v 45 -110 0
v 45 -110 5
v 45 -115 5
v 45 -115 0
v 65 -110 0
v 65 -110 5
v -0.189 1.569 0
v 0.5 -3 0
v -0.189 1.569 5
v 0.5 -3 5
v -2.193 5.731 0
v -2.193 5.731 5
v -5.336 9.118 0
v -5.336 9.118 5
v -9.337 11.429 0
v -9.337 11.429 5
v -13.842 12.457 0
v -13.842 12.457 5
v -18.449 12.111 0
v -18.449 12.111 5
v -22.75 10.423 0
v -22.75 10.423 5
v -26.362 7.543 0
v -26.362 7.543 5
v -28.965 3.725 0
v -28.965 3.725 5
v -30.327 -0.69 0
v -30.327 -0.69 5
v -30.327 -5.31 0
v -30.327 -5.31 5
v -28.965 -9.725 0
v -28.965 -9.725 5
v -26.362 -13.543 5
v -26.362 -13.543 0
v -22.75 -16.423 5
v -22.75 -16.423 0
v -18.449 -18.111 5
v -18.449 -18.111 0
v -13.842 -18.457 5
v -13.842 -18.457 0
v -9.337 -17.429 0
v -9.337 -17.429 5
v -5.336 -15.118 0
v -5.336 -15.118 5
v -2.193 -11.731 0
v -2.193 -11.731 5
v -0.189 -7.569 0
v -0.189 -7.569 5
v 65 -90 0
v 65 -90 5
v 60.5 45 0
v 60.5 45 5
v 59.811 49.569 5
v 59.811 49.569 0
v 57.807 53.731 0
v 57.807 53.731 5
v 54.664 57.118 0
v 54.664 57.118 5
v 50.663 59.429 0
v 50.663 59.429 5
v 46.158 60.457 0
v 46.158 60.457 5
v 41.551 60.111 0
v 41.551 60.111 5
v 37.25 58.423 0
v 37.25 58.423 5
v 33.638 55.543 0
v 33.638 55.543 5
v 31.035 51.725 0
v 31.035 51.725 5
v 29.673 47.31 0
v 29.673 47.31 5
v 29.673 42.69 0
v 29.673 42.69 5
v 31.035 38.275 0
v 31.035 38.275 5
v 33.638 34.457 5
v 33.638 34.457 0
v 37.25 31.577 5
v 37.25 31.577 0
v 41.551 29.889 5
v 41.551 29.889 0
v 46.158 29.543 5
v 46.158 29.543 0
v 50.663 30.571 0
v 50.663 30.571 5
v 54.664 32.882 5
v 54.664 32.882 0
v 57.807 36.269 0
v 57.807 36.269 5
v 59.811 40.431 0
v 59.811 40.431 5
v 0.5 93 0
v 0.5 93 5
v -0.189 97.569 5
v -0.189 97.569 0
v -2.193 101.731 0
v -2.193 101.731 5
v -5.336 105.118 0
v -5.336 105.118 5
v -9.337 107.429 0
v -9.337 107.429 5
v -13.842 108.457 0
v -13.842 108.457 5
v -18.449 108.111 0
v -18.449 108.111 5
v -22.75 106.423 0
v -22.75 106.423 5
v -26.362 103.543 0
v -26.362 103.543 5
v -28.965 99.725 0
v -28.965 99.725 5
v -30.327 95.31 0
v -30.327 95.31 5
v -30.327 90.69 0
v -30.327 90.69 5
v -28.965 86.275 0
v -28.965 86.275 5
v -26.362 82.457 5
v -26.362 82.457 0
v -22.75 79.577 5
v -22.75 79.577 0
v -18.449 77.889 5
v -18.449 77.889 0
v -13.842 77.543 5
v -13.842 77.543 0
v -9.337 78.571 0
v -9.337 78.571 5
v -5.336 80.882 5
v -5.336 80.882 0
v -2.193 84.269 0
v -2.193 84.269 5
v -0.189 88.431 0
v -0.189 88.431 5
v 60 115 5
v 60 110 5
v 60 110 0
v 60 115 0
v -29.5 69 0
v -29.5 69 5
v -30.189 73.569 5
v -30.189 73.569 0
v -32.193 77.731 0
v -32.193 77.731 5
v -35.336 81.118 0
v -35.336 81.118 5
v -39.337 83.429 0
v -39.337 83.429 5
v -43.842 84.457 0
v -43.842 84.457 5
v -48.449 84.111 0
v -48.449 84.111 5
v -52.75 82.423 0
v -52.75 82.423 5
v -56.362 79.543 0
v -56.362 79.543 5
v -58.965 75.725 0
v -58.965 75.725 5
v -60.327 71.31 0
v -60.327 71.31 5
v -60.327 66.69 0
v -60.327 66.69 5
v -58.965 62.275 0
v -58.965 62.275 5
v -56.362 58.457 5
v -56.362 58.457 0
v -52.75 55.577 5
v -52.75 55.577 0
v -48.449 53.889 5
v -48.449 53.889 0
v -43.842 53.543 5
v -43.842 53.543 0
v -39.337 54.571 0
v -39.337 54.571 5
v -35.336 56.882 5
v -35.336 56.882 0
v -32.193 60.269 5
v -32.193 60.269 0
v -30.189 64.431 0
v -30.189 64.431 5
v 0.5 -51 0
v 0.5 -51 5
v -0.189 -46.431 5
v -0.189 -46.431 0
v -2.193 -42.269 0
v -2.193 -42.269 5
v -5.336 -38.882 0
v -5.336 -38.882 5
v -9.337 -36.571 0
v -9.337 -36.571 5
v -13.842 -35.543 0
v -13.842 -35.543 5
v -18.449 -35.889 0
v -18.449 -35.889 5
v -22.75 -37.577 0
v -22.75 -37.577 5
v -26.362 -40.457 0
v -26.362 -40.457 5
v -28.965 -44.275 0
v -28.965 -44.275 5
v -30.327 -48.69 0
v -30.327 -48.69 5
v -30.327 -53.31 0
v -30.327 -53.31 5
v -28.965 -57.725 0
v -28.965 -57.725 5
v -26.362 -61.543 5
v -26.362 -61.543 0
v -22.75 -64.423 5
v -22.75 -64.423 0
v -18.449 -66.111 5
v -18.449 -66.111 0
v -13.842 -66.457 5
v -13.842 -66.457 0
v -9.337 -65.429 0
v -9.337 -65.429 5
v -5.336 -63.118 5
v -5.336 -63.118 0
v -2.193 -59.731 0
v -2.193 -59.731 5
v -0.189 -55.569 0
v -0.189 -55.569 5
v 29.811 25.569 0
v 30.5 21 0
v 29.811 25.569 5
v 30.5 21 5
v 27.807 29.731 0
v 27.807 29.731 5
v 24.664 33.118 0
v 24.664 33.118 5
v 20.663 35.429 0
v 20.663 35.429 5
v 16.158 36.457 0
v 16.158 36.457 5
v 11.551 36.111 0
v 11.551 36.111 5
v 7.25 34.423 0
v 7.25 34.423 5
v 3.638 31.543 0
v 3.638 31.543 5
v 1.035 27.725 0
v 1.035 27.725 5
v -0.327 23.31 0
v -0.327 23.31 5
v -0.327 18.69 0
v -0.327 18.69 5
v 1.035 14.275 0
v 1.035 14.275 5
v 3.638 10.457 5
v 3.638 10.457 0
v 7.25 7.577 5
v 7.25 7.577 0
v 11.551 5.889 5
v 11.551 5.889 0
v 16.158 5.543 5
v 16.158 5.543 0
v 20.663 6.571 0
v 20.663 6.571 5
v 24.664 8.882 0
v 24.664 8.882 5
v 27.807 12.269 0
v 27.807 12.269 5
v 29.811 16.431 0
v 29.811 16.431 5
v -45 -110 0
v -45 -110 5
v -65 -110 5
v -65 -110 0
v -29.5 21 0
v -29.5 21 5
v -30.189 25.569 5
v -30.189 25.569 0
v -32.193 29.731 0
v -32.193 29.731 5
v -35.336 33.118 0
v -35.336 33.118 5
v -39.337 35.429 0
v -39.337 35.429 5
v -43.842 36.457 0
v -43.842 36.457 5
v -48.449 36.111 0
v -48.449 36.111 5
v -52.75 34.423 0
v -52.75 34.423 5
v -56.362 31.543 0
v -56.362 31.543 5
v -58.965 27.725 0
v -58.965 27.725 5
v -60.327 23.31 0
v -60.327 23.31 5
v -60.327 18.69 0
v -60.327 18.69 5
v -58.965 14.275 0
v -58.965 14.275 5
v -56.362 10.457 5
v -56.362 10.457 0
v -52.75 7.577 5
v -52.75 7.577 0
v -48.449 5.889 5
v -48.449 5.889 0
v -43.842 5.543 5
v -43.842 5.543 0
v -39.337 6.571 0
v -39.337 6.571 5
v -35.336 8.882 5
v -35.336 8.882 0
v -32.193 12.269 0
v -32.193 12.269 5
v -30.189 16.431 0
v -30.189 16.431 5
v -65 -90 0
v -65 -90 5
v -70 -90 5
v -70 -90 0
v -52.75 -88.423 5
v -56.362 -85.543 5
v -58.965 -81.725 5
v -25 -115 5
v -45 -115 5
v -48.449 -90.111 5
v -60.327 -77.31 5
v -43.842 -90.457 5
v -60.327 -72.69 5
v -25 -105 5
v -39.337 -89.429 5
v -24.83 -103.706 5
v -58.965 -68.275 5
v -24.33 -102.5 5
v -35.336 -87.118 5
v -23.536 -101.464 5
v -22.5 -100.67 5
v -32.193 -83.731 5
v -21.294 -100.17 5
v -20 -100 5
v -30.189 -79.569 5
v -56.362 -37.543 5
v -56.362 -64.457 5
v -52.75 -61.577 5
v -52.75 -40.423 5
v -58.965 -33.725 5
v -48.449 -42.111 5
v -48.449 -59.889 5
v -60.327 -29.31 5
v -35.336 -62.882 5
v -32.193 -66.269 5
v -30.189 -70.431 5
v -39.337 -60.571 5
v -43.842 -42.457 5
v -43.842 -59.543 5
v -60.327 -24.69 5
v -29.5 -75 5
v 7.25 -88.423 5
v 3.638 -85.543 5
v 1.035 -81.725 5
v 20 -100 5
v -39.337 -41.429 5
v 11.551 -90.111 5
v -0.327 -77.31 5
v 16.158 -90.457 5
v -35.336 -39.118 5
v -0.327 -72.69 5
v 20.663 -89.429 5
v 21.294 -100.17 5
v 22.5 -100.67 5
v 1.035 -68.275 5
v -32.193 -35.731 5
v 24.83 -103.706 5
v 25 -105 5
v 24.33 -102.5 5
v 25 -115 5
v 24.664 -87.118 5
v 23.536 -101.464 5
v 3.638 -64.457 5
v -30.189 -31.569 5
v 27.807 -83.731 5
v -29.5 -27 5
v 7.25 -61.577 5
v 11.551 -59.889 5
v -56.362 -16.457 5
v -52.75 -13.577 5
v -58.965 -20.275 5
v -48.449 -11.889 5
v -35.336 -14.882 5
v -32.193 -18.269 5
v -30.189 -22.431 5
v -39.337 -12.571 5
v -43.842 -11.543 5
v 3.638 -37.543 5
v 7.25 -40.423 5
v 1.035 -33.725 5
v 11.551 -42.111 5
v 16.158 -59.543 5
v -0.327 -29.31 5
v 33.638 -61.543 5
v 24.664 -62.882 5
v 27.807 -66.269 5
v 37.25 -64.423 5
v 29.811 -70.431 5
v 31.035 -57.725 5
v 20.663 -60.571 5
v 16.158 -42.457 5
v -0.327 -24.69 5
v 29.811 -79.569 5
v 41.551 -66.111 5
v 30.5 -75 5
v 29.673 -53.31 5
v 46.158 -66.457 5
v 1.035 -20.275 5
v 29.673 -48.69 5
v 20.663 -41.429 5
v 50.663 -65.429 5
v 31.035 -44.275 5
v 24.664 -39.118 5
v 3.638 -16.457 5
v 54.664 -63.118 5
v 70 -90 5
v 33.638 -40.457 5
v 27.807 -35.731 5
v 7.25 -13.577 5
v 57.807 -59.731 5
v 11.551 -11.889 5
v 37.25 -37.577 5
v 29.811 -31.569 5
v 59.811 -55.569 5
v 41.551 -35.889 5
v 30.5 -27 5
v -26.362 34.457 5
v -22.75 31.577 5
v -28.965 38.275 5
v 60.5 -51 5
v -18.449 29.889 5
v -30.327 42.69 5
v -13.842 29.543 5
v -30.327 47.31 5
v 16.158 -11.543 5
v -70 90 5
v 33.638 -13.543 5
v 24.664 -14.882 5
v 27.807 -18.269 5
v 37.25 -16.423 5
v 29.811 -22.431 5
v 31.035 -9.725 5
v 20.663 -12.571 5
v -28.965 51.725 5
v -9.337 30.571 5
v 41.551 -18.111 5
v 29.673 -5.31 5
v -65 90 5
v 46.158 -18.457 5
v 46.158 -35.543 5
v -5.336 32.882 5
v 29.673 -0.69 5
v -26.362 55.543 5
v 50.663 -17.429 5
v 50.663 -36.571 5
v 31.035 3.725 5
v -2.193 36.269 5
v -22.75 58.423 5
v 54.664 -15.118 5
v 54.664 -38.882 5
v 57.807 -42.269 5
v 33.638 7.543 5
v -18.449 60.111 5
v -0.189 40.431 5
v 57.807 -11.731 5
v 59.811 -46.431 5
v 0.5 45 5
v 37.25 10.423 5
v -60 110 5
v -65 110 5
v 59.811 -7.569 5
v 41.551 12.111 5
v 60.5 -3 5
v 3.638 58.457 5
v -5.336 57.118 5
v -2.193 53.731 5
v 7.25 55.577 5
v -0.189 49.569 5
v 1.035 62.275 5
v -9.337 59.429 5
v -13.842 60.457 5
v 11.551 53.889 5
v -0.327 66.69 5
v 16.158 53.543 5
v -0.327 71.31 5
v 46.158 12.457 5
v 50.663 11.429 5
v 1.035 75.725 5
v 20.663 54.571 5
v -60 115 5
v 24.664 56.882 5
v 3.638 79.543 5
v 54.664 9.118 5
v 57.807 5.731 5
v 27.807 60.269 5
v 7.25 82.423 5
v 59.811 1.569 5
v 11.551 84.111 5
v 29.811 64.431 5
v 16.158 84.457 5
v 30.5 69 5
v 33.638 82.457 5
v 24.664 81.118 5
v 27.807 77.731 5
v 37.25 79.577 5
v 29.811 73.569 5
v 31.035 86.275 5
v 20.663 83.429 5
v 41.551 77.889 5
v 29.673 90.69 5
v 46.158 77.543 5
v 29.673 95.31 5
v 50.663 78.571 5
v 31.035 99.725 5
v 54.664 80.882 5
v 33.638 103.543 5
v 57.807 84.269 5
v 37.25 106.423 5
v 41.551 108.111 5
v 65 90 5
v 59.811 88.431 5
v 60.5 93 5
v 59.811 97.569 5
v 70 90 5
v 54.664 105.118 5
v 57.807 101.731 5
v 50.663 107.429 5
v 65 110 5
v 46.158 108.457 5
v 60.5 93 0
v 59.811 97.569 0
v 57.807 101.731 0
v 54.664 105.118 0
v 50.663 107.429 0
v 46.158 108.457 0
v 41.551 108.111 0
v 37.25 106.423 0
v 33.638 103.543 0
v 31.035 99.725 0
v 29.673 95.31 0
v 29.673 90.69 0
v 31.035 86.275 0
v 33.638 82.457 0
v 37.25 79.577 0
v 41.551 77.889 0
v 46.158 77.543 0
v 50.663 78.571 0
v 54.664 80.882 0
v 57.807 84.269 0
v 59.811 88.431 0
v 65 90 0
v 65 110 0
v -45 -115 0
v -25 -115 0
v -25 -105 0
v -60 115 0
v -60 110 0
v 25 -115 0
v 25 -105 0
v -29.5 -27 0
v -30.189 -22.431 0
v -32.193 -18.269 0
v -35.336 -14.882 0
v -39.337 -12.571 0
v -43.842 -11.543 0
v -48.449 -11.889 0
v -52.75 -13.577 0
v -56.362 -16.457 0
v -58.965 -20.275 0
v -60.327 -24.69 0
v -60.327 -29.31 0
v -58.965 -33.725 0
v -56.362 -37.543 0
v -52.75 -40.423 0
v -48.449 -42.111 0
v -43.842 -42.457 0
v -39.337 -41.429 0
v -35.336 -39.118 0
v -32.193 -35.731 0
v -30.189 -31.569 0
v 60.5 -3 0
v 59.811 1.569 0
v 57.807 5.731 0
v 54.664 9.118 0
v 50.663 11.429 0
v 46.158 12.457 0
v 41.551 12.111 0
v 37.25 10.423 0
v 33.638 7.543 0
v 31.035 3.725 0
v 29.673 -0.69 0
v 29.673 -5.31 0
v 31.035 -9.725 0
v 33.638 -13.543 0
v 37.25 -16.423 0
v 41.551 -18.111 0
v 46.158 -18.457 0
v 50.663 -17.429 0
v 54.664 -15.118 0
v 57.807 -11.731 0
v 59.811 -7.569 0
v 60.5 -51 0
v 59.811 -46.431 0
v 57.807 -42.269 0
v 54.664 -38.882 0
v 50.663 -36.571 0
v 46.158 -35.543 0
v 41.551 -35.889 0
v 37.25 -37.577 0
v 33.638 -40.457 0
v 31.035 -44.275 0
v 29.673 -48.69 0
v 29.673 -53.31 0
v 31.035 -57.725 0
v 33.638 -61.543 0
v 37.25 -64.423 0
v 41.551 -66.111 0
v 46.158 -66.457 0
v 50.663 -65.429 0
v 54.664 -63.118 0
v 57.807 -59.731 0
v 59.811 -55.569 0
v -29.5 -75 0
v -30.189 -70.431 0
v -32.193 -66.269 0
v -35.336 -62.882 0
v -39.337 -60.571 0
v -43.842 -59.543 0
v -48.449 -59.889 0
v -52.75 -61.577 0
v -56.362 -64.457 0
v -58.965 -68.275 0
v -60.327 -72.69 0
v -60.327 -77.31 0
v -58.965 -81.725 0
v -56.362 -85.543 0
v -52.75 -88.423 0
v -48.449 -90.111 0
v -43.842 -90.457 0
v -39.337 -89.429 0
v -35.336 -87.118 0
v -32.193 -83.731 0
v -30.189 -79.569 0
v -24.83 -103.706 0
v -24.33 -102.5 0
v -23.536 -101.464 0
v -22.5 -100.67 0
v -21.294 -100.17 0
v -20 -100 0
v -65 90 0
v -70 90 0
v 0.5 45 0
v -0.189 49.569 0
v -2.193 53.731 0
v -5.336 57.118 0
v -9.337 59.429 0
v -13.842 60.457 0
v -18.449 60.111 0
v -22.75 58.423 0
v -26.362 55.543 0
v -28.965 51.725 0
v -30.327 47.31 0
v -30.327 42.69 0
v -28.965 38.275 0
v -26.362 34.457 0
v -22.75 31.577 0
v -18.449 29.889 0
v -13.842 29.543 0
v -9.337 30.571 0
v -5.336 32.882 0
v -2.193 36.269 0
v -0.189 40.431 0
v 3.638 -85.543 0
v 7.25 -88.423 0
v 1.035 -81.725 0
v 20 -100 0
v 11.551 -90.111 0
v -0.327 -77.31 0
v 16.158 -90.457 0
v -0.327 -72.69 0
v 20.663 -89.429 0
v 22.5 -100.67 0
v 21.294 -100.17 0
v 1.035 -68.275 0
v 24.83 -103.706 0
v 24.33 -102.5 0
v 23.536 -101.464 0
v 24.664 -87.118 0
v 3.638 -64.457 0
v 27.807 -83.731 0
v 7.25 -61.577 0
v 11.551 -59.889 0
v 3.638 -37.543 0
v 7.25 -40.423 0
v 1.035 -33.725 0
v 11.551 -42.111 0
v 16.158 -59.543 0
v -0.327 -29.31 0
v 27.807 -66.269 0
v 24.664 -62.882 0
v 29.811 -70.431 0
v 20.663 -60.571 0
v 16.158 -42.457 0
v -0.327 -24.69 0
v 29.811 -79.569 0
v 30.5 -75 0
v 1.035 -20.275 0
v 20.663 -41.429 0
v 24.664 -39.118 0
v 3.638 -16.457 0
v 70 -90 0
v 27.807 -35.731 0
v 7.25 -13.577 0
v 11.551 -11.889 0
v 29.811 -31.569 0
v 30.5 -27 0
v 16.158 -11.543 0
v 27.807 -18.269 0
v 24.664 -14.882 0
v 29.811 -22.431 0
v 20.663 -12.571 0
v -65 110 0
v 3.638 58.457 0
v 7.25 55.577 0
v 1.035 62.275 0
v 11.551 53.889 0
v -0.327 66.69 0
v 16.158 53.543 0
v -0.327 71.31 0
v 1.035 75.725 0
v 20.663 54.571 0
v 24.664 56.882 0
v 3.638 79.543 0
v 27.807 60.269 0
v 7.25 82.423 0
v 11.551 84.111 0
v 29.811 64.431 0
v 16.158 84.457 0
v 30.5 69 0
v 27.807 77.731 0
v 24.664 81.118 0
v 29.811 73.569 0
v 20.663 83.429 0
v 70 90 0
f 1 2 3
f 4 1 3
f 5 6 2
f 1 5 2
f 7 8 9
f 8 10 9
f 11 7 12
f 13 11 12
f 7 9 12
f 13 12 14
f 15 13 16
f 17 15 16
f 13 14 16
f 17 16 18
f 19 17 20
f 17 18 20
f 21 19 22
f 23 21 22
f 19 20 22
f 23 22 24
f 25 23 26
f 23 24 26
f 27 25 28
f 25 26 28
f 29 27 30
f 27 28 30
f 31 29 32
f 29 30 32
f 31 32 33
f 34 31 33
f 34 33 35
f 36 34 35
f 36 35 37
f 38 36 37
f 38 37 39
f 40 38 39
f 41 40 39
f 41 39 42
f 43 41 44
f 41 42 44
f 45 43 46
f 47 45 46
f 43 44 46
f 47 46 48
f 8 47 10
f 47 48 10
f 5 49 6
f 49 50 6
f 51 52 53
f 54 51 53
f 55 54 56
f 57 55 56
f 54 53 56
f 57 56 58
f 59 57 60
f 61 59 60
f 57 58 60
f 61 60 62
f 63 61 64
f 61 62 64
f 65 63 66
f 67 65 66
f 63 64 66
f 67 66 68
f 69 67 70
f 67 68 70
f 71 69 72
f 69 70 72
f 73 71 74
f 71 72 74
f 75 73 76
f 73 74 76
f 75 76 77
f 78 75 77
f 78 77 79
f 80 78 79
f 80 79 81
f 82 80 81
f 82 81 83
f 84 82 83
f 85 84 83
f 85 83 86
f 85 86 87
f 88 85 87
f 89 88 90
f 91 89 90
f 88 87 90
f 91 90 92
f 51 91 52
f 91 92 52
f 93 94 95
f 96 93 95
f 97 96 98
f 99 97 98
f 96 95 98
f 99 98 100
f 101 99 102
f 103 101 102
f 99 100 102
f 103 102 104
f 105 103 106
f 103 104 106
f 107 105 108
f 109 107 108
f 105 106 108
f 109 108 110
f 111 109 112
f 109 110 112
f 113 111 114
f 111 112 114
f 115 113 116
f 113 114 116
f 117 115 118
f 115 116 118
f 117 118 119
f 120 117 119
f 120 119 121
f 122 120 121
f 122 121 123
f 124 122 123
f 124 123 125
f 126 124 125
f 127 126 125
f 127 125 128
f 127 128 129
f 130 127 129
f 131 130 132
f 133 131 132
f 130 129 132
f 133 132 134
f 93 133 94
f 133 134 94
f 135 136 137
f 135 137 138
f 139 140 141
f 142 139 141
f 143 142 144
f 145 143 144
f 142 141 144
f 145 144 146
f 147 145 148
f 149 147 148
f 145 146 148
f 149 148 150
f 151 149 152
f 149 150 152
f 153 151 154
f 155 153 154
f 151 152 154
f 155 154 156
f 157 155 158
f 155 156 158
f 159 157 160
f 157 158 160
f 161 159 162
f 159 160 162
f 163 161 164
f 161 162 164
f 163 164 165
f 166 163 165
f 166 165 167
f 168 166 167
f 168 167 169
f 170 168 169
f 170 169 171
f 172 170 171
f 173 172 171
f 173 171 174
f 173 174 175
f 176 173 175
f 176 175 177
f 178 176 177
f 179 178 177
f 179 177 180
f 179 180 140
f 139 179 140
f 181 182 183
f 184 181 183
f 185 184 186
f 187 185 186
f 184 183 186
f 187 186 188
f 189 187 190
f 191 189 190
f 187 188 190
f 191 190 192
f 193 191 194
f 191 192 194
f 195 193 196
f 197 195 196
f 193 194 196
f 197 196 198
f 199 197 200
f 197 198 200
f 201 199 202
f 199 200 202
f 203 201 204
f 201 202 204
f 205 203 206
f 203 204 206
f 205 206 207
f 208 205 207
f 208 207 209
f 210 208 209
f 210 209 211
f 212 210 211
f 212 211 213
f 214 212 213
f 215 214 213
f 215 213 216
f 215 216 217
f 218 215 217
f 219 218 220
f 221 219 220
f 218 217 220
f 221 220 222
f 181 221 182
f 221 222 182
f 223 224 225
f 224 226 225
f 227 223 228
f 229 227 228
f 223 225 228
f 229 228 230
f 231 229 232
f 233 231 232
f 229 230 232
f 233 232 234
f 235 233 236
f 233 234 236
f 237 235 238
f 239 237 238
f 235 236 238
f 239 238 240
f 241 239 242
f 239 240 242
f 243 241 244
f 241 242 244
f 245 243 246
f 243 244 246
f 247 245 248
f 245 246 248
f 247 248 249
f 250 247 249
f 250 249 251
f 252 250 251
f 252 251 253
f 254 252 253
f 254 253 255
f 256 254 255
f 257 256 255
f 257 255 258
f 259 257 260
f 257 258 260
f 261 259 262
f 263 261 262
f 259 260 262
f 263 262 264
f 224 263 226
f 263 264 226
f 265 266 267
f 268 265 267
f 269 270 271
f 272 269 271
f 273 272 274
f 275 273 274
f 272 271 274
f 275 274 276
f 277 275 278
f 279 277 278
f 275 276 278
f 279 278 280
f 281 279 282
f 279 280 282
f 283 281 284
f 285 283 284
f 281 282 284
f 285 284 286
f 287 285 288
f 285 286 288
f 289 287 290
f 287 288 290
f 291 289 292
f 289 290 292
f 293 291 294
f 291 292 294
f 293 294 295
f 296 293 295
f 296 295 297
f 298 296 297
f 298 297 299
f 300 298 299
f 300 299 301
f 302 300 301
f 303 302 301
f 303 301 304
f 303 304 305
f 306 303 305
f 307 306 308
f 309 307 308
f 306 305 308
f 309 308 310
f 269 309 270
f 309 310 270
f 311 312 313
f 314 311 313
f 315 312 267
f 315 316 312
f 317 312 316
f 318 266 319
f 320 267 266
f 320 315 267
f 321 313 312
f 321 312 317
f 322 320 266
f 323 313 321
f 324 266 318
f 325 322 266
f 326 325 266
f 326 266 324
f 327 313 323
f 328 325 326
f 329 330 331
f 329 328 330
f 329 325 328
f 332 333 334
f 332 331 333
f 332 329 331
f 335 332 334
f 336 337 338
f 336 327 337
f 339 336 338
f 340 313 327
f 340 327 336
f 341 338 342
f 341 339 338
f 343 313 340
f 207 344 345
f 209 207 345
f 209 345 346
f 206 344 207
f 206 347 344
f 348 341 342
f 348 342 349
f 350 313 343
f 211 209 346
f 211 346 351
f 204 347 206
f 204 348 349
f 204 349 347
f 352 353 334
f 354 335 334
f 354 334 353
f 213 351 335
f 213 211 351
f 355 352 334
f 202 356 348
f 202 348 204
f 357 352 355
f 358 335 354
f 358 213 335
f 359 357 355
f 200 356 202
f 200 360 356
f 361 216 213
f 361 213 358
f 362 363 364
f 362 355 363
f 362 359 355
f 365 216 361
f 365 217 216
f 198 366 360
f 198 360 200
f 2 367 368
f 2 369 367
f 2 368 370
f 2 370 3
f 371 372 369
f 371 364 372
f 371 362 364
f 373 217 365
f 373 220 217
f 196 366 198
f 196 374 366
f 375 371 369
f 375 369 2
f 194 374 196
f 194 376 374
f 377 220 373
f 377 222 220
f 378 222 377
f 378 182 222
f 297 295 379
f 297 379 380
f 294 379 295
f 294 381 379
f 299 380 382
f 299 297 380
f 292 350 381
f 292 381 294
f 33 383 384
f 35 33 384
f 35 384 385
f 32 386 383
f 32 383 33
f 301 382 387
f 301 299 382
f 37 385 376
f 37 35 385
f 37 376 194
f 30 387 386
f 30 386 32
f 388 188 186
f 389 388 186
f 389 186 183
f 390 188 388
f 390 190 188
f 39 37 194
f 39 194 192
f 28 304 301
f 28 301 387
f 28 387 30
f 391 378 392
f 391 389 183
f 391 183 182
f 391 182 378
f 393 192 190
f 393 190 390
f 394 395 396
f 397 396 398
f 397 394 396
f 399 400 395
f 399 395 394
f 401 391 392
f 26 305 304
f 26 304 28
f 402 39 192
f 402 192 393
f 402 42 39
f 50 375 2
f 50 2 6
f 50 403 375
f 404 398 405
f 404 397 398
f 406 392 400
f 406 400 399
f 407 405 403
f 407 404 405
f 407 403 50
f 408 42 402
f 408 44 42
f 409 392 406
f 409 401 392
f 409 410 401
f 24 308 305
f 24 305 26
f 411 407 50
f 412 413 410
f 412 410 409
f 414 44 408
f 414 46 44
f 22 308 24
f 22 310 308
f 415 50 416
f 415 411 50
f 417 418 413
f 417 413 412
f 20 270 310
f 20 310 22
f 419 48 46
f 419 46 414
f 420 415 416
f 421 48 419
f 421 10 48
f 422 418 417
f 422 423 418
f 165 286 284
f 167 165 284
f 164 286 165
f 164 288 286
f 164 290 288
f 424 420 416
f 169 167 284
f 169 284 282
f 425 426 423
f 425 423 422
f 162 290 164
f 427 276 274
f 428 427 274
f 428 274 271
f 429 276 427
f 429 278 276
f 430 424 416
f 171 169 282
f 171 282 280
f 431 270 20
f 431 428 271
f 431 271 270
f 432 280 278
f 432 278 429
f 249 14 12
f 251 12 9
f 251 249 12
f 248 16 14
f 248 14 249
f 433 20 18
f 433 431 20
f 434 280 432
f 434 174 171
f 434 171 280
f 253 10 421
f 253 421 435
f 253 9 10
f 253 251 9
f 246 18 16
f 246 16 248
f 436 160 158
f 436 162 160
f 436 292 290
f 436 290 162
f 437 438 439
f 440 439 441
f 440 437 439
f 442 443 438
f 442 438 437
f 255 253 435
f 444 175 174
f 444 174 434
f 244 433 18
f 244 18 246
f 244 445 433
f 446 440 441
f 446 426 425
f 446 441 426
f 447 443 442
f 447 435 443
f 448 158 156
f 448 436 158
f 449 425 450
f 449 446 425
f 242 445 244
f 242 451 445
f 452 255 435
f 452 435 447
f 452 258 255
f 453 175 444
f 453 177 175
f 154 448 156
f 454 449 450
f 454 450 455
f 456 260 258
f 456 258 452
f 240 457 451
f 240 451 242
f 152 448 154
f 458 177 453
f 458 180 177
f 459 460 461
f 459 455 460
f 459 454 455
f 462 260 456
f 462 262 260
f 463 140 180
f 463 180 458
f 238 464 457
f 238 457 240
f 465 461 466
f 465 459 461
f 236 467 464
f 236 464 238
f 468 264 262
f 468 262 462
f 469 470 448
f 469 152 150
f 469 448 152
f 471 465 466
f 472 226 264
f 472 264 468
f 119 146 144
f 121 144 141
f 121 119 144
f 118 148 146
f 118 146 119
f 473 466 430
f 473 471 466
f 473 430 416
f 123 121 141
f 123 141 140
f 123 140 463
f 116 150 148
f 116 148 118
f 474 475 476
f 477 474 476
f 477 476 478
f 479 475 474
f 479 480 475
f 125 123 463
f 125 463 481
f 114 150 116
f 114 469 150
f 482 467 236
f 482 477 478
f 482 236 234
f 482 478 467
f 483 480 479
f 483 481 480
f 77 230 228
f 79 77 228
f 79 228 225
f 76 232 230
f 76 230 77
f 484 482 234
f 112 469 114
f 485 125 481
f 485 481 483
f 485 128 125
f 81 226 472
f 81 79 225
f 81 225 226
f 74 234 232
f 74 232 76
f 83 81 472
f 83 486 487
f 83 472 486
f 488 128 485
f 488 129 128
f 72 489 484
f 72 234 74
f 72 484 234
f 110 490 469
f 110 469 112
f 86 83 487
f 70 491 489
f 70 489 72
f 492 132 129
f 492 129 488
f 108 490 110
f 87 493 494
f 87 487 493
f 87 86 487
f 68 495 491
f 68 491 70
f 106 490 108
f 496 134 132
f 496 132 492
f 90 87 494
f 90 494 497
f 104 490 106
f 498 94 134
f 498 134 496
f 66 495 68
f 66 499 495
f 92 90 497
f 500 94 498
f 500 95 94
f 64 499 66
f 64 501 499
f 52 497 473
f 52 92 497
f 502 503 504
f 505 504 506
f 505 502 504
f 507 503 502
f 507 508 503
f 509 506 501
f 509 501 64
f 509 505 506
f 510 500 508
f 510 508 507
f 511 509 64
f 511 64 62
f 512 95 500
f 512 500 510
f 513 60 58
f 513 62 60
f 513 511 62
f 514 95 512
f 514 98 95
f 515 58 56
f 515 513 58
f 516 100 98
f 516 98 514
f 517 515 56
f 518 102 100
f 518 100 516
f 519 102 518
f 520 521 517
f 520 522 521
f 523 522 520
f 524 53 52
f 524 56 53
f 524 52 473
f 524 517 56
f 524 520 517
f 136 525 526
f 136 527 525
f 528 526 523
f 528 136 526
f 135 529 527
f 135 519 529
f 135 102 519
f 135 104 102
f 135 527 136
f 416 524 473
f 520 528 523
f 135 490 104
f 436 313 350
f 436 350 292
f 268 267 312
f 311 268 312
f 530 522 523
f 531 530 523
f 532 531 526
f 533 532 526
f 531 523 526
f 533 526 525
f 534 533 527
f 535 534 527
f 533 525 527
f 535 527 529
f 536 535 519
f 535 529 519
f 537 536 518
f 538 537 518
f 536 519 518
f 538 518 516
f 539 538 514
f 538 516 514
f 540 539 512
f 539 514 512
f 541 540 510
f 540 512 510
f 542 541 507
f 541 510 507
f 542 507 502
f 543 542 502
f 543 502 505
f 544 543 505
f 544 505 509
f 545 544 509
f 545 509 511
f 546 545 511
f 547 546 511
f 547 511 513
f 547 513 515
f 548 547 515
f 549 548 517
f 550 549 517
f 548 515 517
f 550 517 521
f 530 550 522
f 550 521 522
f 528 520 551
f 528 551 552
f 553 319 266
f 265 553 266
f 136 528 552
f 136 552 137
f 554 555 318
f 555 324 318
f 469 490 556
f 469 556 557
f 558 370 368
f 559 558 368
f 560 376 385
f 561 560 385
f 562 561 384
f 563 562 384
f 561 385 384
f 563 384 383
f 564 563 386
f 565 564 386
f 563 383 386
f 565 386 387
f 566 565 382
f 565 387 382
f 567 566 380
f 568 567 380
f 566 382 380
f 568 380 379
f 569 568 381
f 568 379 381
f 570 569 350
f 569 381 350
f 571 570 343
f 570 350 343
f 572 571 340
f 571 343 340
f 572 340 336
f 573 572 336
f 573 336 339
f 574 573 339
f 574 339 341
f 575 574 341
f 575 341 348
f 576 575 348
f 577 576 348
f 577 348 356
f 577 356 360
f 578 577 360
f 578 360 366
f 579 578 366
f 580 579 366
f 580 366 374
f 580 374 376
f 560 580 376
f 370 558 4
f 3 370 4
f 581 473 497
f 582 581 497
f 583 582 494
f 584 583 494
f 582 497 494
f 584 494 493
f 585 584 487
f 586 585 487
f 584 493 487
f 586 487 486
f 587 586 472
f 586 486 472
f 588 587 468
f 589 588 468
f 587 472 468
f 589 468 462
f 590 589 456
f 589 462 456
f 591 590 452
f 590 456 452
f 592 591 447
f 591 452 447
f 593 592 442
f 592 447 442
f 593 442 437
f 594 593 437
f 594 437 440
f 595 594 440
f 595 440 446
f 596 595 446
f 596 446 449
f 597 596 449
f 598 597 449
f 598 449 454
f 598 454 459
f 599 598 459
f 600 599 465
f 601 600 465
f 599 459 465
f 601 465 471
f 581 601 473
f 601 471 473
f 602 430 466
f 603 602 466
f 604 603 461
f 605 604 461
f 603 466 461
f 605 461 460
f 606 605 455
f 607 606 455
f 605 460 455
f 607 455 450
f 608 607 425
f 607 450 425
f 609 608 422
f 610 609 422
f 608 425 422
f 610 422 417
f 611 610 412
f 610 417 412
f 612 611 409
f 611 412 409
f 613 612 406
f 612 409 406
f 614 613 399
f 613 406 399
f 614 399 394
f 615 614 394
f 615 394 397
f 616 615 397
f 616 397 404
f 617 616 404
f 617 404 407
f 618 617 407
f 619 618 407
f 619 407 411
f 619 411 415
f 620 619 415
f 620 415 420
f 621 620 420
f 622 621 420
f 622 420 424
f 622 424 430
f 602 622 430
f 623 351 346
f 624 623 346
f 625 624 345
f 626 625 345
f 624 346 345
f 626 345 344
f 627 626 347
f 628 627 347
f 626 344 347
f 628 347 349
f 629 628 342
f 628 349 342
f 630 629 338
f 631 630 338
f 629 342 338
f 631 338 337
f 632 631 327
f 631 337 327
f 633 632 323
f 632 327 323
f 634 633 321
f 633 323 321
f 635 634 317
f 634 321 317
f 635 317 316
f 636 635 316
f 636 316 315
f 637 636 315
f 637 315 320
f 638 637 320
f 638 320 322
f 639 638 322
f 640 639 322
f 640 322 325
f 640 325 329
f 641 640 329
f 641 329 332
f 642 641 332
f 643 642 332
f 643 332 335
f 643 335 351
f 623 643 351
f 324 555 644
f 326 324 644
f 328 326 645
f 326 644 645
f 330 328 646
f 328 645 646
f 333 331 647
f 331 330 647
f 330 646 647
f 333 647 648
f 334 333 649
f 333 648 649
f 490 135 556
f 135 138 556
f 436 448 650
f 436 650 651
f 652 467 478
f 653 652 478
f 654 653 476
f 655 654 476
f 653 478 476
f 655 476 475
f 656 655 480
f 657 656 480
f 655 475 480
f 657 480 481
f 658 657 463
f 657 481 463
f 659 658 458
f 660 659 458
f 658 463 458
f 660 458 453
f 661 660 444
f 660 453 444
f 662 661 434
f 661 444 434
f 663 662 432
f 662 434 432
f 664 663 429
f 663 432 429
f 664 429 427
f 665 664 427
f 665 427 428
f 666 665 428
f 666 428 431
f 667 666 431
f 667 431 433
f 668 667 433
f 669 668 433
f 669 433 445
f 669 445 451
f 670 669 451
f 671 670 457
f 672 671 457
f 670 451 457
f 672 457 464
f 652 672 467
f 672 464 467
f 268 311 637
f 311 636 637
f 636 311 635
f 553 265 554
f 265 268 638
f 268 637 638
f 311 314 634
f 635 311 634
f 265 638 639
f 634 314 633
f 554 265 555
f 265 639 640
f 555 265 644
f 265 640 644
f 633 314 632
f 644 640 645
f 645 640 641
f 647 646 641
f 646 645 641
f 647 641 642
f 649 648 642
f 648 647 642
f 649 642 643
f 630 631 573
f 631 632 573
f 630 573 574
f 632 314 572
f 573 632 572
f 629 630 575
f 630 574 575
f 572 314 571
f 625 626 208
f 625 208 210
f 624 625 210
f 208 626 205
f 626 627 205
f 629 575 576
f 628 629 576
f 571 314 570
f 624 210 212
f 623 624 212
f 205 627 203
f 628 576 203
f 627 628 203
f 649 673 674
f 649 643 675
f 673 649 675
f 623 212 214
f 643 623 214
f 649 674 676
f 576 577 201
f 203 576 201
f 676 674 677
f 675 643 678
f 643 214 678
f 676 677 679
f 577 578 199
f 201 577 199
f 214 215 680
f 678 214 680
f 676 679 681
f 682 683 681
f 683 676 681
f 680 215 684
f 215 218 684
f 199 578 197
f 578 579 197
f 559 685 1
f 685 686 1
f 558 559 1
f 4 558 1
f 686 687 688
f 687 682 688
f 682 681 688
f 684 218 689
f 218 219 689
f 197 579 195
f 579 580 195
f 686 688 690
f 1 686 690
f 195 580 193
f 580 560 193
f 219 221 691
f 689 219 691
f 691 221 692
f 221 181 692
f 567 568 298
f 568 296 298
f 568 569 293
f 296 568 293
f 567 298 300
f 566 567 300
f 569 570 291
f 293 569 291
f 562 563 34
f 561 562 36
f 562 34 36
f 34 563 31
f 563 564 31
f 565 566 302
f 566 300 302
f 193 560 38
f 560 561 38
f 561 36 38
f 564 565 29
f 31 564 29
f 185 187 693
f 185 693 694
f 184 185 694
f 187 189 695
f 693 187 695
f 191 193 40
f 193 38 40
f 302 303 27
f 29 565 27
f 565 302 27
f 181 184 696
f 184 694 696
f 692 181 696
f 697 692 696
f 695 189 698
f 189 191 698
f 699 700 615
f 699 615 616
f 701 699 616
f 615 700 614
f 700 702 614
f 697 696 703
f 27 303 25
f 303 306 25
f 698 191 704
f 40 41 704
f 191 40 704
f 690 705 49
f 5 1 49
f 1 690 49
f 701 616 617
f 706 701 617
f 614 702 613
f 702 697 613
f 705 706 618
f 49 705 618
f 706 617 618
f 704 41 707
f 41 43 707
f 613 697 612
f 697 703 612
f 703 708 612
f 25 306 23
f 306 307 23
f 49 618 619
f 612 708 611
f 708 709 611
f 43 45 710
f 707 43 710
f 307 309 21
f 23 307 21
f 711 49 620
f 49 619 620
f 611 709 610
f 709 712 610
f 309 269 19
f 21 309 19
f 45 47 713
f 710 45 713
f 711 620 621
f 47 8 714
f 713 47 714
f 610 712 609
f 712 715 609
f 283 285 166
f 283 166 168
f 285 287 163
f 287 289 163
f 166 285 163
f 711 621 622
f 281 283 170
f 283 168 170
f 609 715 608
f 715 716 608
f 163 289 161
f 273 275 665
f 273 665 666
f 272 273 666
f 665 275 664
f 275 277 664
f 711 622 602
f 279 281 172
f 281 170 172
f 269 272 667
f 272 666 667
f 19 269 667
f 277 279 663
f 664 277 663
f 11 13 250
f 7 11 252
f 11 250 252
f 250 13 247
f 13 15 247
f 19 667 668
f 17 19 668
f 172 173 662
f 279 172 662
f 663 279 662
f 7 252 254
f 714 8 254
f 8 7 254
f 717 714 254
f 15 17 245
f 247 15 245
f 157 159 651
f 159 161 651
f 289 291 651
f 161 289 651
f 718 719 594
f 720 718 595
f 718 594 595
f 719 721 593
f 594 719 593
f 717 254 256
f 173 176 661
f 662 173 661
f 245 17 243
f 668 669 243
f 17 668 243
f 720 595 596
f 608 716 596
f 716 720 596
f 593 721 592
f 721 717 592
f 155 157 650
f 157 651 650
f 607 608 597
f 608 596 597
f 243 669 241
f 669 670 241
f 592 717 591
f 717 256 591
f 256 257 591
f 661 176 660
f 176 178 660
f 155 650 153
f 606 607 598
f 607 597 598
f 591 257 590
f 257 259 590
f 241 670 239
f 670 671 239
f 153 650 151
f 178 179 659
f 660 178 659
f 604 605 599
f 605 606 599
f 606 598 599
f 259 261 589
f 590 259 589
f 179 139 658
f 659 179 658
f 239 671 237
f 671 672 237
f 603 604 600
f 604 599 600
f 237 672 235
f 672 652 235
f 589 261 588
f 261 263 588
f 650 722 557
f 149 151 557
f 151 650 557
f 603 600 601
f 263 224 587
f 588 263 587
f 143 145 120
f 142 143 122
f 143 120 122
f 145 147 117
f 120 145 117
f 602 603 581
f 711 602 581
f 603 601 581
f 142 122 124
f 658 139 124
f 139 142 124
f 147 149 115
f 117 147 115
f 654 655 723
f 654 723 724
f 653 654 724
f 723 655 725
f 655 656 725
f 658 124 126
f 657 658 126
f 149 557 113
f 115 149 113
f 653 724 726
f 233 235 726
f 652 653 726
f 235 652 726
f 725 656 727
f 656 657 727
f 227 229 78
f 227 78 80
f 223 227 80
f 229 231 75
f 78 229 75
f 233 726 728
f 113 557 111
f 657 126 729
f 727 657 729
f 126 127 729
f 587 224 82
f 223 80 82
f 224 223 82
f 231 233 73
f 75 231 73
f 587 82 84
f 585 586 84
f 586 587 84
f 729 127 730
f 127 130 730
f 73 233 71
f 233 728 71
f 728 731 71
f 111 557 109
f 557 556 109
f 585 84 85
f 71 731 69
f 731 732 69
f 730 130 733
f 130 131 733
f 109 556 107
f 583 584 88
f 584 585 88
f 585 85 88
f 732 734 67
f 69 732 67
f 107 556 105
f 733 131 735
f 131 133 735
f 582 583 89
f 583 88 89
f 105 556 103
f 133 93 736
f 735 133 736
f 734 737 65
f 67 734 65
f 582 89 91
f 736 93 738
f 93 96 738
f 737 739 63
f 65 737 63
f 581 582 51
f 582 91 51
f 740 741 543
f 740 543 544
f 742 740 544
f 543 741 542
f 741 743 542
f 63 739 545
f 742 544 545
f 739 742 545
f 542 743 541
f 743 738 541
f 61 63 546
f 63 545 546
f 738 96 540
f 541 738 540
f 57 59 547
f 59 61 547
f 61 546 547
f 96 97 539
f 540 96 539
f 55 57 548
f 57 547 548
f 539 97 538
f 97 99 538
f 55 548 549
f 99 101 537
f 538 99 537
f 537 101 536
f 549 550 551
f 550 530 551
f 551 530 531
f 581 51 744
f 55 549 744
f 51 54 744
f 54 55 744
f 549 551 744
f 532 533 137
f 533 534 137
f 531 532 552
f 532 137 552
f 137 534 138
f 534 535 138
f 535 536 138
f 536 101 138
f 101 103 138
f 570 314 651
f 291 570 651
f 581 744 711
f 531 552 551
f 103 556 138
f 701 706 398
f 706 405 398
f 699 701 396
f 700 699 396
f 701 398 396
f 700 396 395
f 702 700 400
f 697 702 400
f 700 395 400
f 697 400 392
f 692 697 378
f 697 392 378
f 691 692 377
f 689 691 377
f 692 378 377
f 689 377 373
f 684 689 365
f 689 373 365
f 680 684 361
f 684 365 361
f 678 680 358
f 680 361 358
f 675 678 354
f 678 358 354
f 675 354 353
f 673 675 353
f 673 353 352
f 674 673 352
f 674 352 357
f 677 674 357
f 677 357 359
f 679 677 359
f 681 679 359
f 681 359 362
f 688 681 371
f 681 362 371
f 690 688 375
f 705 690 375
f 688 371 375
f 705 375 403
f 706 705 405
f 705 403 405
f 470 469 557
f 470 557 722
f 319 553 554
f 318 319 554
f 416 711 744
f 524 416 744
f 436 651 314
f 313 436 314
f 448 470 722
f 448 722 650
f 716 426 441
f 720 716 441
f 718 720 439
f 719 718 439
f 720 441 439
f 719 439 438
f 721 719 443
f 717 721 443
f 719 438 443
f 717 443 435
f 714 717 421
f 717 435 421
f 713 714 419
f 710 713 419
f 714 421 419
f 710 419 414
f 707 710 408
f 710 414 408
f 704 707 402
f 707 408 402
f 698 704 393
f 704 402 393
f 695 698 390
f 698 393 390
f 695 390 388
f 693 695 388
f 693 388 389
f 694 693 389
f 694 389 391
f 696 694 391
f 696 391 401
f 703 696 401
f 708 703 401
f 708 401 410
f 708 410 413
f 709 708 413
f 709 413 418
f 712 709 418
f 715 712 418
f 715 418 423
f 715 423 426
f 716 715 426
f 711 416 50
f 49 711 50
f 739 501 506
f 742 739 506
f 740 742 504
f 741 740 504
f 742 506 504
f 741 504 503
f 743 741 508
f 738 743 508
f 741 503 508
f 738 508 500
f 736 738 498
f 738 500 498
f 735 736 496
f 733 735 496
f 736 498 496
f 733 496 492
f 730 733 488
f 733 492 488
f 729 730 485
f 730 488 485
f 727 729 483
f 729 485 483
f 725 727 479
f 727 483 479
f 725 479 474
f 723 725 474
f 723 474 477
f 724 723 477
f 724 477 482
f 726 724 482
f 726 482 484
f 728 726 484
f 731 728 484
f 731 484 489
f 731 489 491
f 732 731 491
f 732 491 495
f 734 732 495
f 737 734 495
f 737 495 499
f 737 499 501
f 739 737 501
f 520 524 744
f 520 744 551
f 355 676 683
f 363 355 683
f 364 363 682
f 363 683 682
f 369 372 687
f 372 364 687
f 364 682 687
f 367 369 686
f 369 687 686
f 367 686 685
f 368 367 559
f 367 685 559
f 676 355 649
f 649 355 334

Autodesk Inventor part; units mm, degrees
ref_plane "YZ Plane" through (0, 0, 0) normal (1, 0, 0) x (0, 1, 0)
ref_plane "XZ Plane" through (0, 0, 0) normal (0, 1, 0) x (-1, 0, 0)
ref_plane "XY Plane" through (0, 0, 0) normal (0, 0, 1) x (1, 0, 0)
sketch "Sketch1" plane through (0, 0, 0) normal (0, 0, 1) x (1, 0, 0)
  line L0 (-70, -115) -> (70, -115)
  line L1 (70, -115) -> (70, 115)
  line L2 (70, 115) -> (-70, 115)
  line L3 (-70, 115) -> (-70, -115)
  point P0 (0, 0)
  dimension "width" = 140
  dimension "d1" = 70
  dimension "d2" = 230
  dimension "d3" = 115
extrude "Extrusion1" add sketch "Sketch1" along normal blind 5
sketch "Sketch2" plane through (0, 0, 5) normal (0, 0, 1) x (1, 0, 0)
  circle A0 centre (-45, 69) radius 15.5
  circle A1 centre (-15, 93) radius 15.5
  point P0 (0, 0)
  dimension "d6" = 31
  dimension "d7" = 69
  dimension "d8" = 45
  dimension "d17" = 31
  dimension "d18" = 30
  dimension "d19" = 24
extrude "Extrusion2" cut sketch "Sketch2" against normal blind 5
pattern_linear "Rectangular Pattern2" count 2 spacing 60 along (1, 0, 0) count 4 spacing 48 along (0, -1, 0) of "Extrusion2"
sketch "Sketch3" plane through (0, 0, 5) normal (0, 0, 1) x (1, 0, 0)
  line L0 (-70, -115) -> (70, -115) projected
  line L1 (-70, -115) -> (-45, -115)
  line L2 (-45, -115) -> (-45, -110)
  line L3 (-45, -110) -> (-70, -110)
  line L4 (-70, -110) -> (-70, -115)
  line L5 (-70, 115) -> (-70, -115) projected
  line L6 (-70, 115) -> (-60, 115)
  line L7 (-60, 115) -> (-60, 110)
  line L8 (-60, 110) -> (-70, 110)
  line L9 (-70, 110) -> (-70, 115)
  line L10 (-70, -115) -> (-65, -115)
  line L11 (-65, -115) -> (-65, -90)
  line L12 (-65, -90) -> (-70, -90)
  line L13 (-70, -90) -> (-70, -115)
  line L14 (-70, 115) -> (-65, 115)
  line L15 (-65, 115) -> (-65, 90)
  line L16 (-65, 90) -> (-70, 90)
  line L17 (-70, 90) -> (-70, 115)
  point P0 (0, 0)
  dimension "d26" = 5
  dimension "d27" = 25
  dimension "d28" = 5
  dimension "d29" = 10
  dimension "d30" = 5
  dimension "d31" = 25
  dimension "d32" = 5
  dimension "d33" = 25
extrude "Extrusion3" cut sketch "Sketch3" against normal blind 10
mirror "Mirror1" about plane through (0, 0, 0) normal (1, 0, 0) of "Extrusion3"
sketch "Sketch4" plane through (0, 0, 5) normal (0, 0, 1) x (1, 0, 0)
  line L0 (-45, -115) -> (45, -115) projected
  line L1 (-25, -115) -> (25, -115)
  line L2 (25, -115) -> (25, -100)
  line L3 (25, -100) -> (-25, -100)
  line L4 (-25, -100) -> (-25, -115)
  point P0 (0, 0)
  dimension "d36" = 25
  dimension "d37" = 50
  dimension "d38" = 15
extrude "Extrusion4" cut sketch "Sketch4" against normal blind 10
fillet "Fillet1" radius 5 2 edges at (-25, -100, 2.5) (25, -100, 2.5)
equation "\"d1\" = 0.5 * width"
equation "\"d3\" = 0.5 * d2"
equation "\"d17\" = d6"
equation "\"d22\" = 2 * d18"
equation "\"d25\" = 2 * d19"
equation "\"d30\" = d26"
equation "\"d31\" = d27"
equation "\"d32\" = d28"
equation "\"d36\" = 0.5 * d37"
properties part number "EBF_001.1-top-plate_cup-holder"
